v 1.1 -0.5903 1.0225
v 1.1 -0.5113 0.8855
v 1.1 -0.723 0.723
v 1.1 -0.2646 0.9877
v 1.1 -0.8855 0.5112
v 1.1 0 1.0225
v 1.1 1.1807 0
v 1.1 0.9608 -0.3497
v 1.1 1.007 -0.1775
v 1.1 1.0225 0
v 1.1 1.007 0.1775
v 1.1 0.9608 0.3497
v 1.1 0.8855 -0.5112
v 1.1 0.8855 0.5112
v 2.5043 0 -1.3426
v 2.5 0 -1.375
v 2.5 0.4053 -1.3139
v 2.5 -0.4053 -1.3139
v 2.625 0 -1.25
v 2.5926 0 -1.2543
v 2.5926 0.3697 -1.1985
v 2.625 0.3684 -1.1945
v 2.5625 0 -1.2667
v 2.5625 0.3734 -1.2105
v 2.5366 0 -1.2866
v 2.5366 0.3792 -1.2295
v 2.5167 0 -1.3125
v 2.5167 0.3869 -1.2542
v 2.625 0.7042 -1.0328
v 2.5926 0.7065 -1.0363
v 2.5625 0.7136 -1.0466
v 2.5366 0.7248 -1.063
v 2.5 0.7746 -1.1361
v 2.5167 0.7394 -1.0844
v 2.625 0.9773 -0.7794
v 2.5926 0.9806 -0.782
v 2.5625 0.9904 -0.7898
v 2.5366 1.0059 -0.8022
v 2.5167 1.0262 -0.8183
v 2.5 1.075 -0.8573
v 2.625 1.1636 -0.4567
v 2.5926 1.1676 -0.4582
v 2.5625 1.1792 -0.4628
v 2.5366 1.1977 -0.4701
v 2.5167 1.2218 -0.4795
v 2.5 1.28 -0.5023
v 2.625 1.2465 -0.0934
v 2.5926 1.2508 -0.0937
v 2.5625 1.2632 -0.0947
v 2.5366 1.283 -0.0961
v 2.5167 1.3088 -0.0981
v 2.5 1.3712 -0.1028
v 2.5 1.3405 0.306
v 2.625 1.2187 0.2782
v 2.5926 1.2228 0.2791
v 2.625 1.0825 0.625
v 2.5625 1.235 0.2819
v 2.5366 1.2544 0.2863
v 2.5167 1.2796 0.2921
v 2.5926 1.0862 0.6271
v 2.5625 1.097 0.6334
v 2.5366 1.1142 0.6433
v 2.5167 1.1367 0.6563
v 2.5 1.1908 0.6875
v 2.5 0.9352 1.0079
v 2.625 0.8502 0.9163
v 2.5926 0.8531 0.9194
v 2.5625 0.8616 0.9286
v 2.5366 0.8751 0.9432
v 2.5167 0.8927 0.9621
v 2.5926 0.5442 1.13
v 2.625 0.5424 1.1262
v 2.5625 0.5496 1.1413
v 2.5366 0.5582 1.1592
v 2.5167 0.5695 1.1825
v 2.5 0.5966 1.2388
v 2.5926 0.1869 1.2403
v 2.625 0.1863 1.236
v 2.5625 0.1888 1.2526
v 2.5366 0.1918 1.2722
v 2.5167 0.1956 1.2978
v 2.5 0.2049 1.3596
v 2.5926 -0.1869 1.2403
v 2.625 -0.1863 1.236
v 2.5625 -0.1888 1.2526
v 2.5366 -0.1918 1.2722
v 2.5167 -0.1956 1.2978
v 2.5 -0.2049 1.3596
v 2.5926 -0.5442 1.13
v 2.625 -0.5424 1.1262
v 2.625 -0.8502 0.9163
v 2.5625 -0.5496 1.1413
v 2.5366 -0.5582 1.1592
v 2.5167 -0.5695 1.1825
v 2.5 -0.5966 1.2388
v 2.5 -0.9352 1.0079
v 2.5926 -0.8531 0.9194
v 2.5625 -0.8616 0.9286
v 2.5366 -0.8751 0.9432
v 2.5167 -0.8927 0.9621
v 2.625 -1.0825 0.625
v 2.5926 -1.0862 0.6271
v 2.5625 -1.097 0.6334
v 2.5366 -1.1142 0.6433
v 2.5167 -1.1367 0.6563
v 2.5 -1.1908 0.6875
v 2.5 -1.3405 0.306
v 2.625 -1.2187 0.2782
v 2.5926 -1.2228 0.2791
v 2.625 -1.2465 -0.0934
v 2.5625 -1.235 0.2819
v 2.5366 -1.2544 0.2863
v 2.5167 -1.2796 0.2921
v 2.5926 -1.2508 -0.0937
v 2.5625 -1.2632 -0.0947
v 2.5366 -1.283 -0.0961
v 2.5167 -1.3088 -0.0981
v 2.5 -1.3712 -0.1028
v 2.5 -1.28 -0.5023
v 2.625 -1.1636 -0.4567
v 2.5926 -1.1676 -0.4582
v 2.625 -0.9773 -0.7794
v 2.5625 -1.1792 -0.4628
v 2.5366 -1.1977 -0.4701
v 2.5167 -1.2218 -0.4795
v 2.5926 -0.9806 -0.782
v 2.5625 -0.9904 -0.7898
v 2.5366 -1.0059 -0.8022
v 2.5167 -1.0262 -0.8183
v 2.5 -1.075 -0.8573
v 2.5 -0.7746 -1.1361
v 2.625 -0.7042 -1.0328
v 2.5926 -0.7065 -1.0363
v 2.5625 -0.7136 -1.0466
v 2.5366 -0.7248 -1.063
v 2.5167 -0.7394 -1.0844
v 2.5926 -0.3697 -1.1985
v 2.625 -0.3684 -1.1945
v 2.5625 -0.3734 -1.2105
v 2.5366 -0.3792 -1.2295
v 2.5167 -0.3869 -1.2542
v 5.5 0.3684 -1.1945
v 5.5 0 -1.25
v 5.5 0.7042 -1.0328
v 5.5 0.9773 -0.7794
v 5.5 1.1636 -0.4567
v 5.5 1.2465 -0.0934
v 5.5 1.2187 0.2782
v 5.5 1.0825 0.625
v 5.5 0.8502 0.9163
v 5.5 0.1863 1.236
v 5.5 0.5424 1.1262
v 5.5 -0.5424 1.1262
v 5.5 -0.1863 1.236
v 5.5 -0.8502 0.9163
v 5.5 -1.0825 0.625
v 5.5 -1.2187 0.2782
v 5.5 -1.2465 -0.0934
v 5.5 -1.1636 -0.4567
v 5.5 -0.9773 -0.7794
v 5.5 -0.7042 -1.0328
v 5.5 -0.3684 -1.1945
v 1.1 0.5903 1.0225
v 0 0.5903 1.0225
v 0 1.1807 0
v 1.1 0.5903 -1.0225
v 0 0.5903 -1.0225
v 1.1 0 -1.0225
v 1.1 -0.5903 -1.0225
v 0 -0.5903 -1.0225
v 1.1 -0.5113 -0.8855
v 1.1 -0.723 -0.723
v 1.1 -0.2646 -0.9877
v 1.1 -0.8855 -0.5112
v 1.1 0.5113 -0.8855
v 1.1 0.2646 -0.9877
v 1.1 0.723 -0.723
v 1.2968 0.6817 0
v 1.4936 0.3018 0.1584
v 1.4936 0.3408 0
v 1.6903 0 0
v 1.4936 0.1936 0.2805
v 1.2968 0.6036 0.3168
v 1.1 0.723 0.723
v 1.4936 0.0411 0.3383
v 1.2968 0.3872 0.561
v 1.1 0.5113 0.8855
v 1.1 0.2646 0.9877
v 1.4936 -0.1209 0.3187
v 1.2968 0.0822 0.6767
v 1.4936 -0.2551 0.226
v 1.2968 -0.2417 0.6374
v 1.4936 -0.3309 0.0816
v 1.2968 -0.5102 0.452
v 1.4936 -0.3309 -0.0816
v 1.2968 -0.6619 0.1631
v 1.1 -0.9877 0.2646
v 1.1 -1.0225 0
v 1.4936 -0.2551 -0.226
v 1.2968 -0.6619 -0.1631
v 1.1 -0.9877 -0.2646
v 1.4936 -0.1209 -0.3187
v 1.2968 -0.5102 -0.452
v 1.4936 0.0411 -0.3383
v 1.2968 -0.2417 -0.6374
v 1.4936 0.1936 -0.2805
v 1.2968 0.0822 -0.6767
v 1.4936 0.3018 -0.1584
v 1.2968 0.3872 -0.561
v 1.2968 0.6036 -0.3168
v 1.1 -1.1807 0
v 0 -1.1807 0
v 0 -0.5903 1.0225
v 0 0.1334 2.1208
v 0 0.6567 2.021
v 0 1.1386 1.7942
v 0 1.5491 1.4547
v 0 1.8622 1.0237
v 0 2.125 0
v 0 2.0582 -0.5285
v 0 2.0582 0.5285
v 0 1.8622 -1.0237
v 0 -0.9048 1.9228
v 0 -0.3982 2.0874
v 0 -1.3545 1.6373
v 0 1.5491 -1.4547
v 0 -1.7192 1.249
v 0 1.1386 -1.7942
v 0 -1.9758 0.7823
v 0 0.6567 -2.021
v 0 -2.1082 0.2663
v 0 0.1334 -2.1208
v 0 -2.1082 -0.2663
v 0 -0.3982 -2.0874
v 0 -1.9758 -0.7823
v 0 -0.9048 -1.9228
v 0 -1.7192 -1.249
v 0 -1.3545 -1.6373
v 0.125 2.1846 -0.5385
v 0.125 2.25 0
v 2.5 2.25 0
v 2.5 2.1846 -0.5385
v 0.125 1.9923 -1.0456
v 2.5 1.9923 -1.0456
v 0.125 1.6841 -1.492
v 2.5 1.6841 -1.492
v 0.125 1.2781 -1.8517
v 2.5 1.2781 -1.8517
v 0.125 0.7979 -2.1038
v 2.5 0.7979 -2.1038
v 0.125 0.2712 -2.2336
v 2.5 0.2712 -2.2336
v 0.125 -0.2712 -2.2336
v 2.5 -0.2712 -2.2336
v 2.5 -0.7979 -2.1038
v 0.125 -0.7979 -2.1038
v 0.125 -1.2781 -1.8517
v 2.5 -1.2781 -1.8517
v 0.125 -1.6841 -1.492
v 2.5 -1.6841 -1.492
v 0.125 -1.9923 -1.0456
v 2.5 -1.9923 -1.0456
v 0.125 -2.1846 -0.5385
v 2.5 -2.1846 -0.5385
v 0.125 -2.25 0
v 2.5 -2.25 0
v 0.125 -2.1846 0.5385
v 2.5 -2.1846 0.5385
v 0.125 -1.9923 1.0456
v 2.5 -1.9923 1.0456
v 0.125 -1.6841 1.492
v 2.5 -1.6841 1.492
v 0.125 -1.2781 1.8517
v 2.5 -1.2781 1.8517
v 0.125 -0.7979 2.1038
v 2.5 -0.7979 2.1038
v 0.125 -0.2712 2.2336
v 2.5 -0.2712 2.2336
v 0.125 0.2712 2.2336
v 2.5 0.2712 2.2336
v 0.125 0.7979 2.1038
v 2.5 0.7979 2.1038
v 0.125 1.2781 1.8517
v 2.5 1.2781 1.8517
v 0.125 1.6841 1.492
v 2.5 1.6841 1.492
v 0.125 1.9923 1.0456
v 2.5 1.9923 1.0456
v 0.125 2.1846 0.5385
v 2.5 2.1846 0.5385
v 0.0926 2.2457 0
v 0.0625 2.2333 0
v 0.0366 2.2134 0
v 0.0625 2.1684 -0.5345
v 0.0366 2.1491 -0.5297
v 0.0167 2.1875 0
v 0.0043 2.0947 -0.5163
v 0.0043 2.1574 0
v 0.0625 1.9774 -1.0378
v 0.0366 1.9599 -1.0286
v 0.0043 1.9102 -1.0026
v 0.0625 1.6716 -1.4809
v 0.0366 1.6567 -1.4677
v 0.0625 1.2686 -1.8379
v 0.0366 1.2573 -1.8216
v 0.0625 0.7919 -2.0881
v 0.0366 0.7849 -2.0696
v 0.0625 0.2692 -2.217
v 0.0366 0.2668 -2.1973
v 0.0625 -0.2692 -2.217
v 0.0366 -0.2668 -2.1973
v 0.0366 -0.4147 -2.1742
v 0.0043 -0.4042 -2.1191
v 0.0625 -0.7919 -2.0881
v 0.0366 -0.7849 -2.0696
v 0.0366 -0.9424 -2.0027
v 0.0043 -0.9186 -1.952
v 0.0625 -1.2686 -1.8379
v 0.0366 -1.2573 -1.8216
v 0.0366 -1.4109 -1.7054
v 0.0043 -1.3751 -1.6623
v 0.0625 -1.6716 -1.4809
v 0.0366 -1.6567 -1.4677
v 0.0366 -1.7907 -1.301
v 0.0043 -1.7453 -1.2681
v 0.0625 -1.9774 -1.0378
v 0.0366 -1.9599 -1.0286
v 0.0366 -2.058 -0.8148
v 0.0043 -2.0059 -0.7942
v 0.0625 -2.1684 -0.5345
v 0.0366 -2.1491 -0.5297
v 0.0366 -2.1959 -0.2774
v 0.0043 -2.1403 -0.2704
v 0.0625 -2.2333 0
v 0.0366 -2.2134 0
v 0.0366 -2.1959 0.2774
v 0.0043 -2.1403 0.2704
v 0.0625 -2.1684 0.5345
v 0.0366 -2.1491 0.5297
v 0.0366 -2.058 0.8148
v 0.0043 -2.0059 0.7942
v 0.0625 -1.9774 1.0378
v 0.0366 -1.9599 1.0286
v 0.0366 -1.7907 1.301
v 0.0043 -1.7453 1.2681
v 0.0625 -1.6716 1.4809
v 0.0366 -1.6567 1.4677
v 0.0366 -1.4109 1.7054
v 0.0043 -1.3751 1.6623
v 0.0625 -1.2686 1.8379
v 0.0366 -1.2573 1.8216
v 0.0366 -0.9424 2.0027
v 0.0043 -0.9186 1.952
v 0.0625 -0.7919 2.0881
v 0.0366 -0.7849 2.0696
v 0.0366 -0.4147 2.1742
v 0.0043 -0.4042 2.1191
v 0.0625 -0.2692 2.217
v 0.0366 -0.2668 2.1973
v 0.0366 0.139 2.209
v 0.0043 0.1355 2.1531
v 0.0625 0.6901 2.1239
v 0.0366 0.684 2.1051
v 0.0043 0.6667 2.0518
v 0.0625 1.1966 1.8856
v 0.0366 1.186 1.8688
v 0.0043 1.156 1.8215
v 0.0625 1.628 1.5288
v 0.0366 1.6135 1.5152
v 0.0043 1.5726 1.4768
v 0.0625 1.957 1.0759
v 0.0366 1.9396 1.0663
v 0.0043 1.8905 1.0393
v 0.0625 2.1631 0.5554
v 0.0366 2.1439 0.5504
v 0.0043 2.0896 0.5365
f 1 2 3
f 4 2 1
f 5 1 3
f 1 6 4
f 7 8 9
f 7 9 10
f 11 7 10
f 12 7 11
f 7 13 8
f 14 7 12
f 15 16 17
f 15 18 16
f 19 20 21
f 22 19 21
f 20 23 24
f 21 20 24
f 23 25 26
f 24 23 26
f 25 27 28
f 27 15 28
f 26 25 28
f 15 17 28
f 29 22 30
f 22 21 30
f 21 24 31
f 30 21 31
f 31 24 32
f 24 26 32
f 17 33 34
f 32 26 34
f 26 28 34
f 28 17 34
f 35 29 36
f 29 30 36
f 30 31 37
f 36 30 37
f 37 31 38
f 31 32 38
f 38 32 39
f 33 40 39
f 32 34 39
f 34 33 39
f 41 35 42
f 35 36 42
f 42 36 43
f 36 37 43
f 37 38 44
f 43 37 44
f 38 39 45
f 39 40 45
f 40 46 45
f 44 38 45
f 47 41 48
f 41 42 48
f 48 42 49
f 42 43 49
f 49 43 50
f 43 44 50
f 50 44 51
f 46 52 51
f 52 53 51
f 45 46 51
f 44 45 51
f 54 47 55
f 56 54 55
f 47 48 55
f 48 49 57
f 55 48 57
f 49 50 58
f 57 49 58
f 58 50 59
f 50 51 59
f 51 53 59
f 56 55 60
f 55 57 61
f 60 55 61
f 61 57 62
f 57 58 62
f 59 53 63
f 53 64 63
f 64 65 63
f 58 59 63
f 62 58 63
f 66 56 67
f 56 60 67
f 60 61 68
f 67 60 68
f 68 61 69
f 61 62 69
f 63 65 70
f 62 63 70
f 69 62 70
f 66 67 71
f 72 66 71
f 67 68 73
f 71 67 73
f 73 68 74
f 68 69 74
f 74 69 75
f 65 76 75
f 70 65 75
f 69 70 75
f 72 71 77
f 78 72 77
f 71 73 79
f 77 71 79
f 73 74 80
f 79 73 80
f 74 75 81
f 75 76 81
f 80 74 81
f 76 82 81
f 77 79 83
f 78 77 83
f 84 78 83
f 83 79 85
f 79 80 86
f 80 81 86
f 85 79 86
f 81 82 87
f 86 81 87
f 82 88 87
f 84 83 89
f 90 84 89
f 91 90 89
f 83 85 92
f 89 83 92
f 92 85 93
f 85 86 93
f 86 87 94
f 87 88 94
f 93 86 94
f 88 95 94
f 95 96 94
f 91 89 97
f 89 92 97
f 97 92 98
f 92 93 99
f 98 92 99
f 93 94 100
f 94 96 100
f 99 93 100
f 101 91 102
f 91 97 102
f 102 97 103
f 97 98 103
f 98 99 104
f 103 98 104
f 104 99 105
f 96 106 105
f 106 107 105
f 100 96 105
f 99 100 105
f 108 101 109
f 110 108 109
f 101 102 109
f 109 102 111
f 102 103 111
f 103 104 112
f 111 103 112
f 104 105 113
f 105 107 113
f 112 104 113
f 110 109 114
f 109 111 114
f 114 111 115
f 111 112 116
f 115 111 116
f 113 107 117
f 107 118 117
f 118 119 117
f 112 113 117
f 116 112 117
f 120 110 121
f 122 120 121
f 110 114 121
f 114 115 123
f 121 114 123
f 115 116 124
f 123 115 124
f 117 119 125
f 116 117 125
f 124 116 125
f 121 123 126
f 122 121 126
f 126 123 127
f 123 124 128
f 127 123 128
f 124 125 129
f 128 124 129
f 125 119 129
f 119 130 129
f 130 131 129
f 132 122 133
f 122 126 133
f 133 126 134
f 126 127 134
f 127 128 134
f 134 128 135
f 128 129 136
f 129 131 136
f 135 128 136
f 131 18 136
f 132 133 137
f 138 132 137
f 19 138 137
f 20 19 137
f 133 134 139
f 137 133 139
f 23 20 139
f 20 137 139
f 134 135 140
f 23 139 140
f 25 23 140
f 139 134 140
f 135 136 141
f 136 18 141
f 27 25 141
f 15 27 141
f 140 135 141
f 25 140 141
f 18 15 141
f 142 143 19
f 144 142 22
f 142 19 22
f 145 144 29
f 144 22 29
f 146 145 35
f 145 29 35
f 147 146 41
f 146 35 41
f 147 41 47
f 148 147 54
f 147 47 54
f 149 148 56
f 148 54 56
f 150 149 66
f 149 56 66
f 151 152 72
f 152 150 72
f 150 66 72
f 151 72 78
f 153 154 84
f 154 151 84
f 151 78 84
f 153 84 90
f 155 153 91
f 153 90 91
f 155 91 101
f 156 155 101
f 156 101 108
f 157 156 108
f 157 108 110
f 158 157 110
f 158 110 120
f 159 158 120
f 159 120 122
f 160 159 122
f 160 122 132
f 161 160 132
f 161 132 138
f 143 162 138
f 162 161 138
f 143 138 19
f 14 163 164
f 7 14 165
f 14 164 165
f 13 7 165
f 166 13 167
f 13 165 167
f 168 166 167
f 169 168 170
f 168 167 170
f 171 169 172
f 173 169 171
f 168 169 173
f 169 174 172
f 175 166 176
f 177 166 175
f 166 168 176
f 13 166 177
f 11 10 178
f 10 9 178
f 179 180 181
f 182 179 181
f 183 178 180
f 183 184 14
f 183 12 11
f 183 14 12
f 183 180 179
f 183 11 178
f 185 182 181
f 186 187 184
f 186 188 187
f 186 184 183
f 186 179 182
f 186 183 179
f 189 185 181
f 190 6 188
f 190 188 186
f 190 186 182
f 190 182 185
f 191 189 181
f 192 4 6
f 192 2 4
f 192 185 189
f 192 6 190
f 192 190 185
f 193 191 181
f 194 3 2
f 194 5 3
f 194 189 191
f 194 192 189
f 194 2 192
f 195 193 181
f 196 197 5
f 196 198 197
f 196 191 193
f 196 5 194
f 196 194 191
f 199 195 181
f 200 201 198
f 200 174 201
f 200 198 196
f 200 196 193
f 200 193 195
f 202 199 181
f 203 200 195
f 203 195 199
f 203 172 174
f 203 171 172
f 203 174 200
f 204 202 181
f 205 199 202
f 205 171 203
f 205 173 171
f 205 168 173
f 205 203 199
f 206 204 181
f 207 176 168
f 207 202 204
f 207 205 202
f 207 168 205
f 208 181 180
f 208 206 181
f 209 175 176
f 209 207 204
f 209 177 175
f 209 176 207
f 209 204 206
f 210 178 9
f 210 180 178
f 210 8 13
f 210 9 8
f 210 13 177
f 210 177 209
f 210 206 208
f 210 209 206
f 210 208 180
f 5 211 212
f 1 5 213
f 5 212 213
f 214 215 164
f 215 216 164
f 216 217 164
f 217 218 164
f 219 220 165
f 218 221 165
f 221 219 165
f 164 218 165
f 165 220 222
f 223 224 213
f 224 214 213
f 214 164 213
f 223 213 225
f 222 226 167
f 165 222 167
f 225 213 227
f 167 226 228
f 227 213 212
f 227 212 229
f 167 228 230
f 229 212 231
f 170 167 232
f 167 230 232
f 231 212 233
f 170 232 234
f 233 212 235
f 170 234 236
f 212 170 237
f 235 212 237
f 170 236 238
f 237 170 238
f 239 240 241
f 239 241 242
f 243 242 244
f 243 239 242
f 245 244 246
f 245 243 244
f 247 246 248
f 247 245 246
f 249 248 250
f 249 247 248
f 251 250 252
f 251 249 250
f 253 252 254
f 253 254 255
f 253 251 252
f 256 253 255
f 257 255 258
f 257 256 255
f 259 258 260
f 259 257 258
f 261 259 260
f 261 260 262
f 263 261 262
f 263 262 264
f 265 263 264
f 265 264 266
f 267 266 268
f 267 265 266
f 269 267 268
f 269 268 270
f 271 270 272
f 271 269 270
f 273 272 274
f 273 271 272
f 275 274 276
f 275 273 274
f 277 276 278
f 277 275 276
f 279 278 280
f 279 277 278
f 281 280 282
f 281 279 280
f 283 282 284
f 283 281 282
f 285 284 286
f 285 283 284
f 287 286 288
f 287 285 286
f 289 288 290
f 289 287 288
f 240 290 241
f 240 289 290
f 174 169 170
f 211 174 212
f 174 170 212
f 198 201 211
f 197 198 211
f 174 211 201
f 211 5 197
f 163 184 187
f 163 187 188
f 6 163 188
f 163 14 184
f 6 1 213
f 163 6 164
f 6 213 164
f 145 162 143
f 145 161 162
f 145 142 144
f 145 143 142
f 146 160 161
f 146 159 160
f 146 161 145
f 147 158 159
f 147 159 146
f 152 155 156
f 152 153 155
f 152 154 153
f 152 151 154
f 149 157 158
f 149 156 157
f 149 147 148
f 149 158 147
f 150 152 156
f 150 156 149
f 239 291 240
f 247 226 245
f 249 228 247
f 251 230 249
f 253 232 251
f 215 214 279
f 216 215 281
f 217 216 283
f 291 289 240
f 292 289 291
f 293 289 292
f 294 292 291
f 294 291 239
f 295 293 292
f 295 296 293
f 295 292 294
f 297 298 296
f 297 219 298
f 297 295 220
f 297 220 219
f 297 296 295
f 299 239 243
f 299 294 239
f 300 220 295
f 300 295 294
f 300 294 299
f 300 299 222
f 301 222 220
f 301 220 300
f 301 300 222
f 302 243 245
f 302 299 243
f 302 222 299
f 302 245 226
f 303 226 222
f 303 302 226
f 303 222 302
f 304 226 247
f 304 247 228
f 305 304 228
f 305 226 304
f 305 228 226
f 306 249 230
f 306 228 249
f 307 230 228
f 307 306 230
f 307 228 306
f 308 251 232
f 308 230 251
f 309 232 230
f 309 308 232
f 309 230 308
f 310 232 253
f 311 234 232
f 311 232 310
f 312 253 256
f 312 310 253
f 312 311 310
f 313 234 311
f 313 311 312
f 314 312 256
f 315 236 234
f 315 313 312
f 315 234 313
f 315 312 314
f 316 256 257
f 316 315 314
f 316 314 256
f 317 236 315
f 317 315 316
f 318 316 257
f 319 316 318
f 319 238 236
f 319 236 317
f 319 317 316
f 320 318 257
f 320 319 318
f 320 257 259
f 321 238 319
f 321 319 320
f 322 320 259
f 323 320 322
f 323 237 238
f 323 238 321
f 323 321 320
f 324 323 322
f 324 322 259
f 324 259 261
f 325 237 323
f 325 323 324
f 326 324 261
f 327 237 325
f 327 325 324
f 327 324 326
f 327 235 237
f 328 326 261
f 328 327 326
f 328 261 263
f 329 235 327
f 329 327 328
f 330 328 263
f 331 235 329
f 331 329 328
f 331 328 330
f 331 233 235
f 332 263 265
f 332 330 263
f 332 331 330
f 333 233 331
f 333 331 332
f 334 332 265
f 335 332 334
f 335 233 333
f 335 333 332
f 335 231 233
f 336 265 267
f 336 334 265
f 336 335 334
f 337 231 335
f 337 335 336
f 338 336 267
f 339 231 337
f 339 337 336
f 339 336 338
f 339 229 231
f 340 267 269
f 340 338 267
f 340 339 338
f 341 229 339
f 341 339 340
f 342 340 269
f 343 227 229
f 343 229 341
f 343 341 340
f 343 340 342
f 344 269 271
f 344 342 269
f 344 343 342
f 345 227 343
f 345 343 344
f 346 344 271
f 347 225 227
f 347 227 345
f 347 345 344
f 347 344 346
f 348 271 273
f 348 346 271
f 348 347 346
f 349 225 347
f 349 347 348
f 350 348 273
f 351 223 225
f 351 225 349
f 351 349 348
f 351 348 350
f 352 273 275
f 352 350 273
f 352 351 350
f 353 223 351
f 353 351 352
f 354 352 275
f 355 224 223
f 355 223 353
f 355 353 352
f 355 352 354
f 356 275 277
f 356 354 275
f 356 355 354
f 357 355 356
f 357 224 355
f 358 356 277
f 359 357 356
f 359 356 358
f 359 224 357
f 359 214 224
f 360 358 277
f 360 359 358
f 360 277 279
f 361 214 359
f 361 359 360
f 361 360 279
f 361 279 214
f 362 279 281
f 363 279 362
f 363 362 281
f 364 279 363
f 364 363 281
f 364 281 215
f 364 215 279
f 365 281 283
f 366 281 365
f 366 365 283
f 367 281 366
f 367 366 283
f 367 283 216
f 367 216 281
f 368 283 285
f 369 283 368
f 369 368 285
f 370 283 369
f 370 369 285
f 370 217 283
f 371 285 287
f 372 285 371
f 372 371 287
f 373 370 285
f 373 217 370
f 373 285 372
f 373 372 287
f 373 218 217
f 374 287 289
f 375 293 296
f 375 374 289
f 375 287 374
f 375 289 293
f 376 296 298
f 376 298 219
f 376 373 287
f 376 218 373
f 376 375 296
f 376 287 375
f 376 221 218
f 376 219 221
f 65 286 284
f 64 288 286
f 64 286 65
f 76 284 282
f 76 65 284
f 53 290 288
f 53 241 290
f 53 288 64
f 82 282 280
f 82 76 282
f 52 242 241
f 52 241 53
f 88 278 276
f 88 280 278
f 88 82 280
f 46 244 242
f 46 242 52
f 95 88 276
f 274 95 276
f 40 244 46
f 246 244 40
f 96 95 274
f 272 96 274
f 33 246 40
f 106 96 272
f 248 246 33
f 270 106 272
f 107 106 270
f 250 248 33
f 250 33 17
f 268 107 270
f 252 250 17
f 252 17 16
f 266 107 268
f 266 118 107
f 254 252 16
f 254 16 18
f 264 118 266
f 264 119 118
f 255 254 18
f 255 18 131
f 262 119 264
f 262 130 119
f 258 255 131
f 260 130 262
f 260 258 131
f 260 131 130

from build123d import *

# Parameters (mm, degrees)
SKETCH1_W               = 2.5
SKETCH1_H               = 2.25
SKETCH2_R               = 1.25
BOSS_EXTRUDE1_DEPTH     = 8
CUT_EXTRUDE1_DEPTH      = 1.1
CHAMFER1_SIZE           = 0.2535
FILLET1_R               = 0.125
SKETCH5_W               = 5
SKETCH5_H               = 4.609791228
CUT_EXTRUDE2_DEPTH      = 10
CUT_EXTRUDE2_DEPTH_BACK = 10


with BuildPart() as part:
    # Sketch1 → Revolve1 (revolve)
    with BuildSketch(Plane(origin=(0, 0, 0), x_dir=(-1, 0, 0), z_dir=(0, 0, -1))):
        with Locations((-1.25, 1.125)):
            Rectangle(SKETCH1_W, SKETCH1_H)
    revolve(axis=Axis((2.5, 0, 0), (-1, 0, 0)))

    # Sketch2 → Boss-Extrude1 (add)
    with BuildSketch(Plane(origin=(2.5, 0, 0), x_dir=(0, 0, -1), z_dir=(1, 0, 0))):
        Circle(SKETCH2_R)
    extrude(amount=BOSS_EXTRUDE1_DEPTH)

    # Sketch3 → Cut-Extrude1 (cut)
    with BuildSketch(Plane.ZY):
        Polygon((-1.0225, -0.59034065), (0, -1.1806813), (1.0225, -0.59034065), (1.0225, 0.59034065), (0, 1.1806813), (-1.0225, 0.59034065), align=None)
    extrude(amount=-CUT_EXTRUDE1_DEPTH, mode=Mode.SUBTRACT)

    # Sketch4 → Cut-Revolve1 (revolve, cut)
    with BuildSketch(Plane.XY):
        Polygon((1.1, 1.0225), (1.1, 0), (1.69034065, 0), align=None)
    revolve(axis=Axis((1.099975, 0, 0), (1, 0, 0)), mode=Mode.SUBTRACT)

    # Chamfer1
    chamfer1_edges = [part.edges().sort_by_distance(p)[0] for p in [
        (10.5, 0, 1.25),
    ]]
    chamfer(chamfer1_edges, length=CHAMFER1_SIZE)

    # Fillet1
    fillet1_edges = [part.edges().sort_by_distance(p)[0] for p in [
        (0, -2.25, 0),
        (2.5, 0, 1.25),
    ]]
    fillet(fillet1_edges, radius=FILLET1_R)

    # Sketch5 → Cut-Extrude2 (cut, two sides)
    with BuildSketch(Plane.XY) as cut_extrude2_sk:
        with Locations((8, -0.404062901)):
            Rectangle(SKETCH5_W, SKETCH5_H)
    extrude(amount=CUT_EXTRUDE2_DEPTH, mode=Mode.SUBTRACT)
    extrude(cut_extrude2_sk.sketch, amount=-CUT_EXTRUDE2_DEPTH_BACK, mode=Mode.SUBTRACT)


solid = part.part
